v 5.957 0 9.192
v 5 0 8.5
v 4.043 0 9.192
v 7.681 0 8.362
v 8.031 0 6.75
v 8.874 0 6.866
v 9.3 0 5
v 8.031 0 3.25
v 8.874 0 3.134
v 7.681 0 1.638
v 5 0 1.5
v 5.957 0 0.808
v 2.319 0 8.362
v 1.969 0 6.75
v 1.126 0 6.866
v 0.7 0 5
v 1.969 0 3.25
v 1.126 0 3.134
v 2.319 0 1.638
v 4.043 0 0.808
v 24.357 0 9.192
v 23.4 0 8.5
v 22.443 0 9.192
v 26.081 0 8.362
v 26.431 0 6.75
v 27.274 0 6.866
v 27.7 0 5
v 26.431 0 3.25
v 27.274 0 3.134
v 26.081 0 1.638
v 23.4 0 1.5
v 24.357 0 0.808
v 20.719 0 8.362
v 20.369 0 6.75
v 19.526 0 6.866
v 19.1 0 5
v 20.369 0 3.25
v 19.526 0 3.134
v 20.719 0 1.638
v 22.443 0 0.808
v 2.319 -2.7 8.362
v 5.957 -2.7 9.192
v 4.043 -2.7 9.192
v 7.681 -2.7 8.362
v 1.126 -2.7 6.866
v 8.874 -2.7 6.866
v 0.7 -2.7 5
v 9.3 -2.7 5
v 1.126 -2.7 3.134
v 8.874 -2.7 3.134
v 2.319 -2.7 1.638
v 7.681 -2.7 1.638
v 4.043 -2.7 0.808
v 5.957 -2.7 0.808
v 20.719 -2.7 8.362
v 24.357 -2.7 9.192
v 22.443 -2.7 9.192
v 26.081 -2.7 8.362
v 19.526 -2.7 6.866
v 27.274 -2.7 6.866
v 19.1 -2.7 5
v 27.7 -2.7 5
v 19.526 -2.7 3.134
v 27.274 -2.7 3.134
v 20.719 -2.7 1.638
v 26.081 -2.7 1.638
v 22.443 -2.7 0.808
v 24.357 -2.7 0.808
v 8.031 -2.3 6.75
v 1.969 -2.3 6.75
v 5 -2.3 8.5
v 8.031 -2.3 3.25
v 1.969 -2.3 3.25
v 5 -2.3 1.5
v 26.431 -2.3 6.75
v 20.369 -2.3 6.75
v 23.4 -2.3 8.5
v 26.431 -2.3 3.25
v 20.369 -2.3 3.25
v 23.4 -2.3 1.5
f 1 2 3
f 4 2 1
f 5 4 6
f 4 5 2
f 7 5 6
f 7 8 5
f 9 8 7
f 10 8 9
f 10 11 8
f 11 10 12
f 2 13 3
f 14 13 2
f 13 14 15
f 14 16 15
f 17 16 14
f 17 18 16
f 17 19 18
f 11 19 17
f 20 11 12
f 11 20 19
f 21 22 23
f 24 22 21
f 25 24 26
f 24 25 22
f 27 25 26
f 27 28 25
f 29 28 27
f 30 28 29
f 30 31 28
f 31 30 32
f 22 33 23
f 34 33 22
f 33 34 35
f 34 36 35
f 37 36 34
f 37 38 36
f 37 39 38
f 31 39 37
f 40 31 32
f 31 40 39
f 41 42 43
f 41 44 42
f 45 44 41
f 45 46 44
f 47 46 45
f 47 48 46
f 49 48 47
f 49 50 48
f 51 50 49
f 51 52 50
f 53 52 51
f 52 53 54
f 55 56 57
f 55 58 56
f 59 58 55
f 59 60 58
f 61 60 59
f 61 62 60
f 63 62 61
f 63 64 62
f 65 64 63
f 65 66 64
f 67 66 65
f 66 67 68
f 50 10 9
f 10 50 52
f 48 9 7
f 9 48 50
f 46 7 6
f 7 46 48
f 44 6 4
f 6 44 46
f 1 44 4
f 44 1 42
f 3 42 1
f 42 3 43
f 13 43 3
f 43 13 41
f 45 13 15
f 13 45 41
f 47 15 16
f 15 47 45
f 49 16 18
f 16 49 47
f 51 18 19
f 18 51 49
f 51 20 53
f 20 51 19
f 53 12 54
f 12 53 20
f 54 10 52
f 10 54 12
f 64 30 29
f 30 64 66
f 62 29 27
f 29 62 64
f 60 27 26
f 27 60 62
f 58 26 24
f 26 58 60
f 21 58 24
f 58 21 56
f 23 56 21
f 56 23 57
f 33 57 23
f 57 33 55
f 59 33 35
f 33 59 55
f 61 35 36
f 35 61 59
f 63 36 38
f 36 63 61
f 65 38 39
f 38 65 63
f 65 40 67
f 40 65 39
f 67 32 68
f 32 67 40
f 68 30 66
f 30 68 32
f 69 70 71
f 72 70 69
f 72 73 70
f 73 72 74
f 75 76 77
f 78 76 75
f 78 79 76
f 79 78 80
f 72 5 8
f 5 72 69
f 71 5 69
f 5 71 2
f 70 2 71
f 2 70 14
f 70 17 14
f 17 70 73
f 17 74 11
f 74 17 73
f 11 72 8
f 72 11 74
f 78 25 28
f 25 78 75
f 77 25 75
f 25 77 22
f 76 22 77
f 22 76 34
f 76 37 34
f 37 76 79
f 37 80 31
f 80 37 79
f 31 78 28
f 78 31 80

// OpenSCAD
// Copyright (C) 2025 Arif K. Rafiq
// This program is free software: you can redistribute it and/or modify
// it under the terms of the GNU General Public License as published by
// the Free Software Foundation, either version 3 of the License, or
// (at your option) any later version.

// This program is distributed in the hope that it will be useful,
// but WITHOUT ANY WARRANTY; without even the implied warranty of
// MERCHANTABILITY or FITNESS FOR A PARTICULAR PURPOSE.  See the
// GNU General Public License for more details.

// You should have received a copy of the GNU General Public License
// along with this file.  If not, see <https://www.gnu.org/licenses/>,
// or write to: license@temperedoptimism.com


// NOTHING SHOWS
// Fixed in example3.scad

tWallMin = 0.40;         // Limit for 3D printer, I have 0.2
pHexSink = [3.5, 2.3];
vTerminal0 = [5.0, 5.0];
vTerminal1 = [23.4, 5.0];
fx0=2;    //convexity
tEps=0.01; // Fixing conflicting bodies

//25:00
// Rotate
rotate([90,0,0]){
difference(){
  // hex pocket surround
  // Read about render(convexity)                           
  linear_extrude(pHexSink.y+ tWallMin, convexity=fx0){  
    translate(vTerminal0)  circle(pHexSink.x +(tWallMin *2));
    translate(vTerminal1)  circle(pHexSink.x +(tWallMin *2));
  }
  //hex pocket
  // Solve Conflicting bodies
  translate([0,0, -tEps]) linear_extrude(pHexSink.y+tEps, convexity=fx0){
      translate(vTerminal0)  rotate([0,0,30]) circle(pHexSink.x, $fn=6);
      translate(vTerminal1)  rotate([0,0,30]) circle(pHexSink.x, $fn=6);
  }
 }
}
